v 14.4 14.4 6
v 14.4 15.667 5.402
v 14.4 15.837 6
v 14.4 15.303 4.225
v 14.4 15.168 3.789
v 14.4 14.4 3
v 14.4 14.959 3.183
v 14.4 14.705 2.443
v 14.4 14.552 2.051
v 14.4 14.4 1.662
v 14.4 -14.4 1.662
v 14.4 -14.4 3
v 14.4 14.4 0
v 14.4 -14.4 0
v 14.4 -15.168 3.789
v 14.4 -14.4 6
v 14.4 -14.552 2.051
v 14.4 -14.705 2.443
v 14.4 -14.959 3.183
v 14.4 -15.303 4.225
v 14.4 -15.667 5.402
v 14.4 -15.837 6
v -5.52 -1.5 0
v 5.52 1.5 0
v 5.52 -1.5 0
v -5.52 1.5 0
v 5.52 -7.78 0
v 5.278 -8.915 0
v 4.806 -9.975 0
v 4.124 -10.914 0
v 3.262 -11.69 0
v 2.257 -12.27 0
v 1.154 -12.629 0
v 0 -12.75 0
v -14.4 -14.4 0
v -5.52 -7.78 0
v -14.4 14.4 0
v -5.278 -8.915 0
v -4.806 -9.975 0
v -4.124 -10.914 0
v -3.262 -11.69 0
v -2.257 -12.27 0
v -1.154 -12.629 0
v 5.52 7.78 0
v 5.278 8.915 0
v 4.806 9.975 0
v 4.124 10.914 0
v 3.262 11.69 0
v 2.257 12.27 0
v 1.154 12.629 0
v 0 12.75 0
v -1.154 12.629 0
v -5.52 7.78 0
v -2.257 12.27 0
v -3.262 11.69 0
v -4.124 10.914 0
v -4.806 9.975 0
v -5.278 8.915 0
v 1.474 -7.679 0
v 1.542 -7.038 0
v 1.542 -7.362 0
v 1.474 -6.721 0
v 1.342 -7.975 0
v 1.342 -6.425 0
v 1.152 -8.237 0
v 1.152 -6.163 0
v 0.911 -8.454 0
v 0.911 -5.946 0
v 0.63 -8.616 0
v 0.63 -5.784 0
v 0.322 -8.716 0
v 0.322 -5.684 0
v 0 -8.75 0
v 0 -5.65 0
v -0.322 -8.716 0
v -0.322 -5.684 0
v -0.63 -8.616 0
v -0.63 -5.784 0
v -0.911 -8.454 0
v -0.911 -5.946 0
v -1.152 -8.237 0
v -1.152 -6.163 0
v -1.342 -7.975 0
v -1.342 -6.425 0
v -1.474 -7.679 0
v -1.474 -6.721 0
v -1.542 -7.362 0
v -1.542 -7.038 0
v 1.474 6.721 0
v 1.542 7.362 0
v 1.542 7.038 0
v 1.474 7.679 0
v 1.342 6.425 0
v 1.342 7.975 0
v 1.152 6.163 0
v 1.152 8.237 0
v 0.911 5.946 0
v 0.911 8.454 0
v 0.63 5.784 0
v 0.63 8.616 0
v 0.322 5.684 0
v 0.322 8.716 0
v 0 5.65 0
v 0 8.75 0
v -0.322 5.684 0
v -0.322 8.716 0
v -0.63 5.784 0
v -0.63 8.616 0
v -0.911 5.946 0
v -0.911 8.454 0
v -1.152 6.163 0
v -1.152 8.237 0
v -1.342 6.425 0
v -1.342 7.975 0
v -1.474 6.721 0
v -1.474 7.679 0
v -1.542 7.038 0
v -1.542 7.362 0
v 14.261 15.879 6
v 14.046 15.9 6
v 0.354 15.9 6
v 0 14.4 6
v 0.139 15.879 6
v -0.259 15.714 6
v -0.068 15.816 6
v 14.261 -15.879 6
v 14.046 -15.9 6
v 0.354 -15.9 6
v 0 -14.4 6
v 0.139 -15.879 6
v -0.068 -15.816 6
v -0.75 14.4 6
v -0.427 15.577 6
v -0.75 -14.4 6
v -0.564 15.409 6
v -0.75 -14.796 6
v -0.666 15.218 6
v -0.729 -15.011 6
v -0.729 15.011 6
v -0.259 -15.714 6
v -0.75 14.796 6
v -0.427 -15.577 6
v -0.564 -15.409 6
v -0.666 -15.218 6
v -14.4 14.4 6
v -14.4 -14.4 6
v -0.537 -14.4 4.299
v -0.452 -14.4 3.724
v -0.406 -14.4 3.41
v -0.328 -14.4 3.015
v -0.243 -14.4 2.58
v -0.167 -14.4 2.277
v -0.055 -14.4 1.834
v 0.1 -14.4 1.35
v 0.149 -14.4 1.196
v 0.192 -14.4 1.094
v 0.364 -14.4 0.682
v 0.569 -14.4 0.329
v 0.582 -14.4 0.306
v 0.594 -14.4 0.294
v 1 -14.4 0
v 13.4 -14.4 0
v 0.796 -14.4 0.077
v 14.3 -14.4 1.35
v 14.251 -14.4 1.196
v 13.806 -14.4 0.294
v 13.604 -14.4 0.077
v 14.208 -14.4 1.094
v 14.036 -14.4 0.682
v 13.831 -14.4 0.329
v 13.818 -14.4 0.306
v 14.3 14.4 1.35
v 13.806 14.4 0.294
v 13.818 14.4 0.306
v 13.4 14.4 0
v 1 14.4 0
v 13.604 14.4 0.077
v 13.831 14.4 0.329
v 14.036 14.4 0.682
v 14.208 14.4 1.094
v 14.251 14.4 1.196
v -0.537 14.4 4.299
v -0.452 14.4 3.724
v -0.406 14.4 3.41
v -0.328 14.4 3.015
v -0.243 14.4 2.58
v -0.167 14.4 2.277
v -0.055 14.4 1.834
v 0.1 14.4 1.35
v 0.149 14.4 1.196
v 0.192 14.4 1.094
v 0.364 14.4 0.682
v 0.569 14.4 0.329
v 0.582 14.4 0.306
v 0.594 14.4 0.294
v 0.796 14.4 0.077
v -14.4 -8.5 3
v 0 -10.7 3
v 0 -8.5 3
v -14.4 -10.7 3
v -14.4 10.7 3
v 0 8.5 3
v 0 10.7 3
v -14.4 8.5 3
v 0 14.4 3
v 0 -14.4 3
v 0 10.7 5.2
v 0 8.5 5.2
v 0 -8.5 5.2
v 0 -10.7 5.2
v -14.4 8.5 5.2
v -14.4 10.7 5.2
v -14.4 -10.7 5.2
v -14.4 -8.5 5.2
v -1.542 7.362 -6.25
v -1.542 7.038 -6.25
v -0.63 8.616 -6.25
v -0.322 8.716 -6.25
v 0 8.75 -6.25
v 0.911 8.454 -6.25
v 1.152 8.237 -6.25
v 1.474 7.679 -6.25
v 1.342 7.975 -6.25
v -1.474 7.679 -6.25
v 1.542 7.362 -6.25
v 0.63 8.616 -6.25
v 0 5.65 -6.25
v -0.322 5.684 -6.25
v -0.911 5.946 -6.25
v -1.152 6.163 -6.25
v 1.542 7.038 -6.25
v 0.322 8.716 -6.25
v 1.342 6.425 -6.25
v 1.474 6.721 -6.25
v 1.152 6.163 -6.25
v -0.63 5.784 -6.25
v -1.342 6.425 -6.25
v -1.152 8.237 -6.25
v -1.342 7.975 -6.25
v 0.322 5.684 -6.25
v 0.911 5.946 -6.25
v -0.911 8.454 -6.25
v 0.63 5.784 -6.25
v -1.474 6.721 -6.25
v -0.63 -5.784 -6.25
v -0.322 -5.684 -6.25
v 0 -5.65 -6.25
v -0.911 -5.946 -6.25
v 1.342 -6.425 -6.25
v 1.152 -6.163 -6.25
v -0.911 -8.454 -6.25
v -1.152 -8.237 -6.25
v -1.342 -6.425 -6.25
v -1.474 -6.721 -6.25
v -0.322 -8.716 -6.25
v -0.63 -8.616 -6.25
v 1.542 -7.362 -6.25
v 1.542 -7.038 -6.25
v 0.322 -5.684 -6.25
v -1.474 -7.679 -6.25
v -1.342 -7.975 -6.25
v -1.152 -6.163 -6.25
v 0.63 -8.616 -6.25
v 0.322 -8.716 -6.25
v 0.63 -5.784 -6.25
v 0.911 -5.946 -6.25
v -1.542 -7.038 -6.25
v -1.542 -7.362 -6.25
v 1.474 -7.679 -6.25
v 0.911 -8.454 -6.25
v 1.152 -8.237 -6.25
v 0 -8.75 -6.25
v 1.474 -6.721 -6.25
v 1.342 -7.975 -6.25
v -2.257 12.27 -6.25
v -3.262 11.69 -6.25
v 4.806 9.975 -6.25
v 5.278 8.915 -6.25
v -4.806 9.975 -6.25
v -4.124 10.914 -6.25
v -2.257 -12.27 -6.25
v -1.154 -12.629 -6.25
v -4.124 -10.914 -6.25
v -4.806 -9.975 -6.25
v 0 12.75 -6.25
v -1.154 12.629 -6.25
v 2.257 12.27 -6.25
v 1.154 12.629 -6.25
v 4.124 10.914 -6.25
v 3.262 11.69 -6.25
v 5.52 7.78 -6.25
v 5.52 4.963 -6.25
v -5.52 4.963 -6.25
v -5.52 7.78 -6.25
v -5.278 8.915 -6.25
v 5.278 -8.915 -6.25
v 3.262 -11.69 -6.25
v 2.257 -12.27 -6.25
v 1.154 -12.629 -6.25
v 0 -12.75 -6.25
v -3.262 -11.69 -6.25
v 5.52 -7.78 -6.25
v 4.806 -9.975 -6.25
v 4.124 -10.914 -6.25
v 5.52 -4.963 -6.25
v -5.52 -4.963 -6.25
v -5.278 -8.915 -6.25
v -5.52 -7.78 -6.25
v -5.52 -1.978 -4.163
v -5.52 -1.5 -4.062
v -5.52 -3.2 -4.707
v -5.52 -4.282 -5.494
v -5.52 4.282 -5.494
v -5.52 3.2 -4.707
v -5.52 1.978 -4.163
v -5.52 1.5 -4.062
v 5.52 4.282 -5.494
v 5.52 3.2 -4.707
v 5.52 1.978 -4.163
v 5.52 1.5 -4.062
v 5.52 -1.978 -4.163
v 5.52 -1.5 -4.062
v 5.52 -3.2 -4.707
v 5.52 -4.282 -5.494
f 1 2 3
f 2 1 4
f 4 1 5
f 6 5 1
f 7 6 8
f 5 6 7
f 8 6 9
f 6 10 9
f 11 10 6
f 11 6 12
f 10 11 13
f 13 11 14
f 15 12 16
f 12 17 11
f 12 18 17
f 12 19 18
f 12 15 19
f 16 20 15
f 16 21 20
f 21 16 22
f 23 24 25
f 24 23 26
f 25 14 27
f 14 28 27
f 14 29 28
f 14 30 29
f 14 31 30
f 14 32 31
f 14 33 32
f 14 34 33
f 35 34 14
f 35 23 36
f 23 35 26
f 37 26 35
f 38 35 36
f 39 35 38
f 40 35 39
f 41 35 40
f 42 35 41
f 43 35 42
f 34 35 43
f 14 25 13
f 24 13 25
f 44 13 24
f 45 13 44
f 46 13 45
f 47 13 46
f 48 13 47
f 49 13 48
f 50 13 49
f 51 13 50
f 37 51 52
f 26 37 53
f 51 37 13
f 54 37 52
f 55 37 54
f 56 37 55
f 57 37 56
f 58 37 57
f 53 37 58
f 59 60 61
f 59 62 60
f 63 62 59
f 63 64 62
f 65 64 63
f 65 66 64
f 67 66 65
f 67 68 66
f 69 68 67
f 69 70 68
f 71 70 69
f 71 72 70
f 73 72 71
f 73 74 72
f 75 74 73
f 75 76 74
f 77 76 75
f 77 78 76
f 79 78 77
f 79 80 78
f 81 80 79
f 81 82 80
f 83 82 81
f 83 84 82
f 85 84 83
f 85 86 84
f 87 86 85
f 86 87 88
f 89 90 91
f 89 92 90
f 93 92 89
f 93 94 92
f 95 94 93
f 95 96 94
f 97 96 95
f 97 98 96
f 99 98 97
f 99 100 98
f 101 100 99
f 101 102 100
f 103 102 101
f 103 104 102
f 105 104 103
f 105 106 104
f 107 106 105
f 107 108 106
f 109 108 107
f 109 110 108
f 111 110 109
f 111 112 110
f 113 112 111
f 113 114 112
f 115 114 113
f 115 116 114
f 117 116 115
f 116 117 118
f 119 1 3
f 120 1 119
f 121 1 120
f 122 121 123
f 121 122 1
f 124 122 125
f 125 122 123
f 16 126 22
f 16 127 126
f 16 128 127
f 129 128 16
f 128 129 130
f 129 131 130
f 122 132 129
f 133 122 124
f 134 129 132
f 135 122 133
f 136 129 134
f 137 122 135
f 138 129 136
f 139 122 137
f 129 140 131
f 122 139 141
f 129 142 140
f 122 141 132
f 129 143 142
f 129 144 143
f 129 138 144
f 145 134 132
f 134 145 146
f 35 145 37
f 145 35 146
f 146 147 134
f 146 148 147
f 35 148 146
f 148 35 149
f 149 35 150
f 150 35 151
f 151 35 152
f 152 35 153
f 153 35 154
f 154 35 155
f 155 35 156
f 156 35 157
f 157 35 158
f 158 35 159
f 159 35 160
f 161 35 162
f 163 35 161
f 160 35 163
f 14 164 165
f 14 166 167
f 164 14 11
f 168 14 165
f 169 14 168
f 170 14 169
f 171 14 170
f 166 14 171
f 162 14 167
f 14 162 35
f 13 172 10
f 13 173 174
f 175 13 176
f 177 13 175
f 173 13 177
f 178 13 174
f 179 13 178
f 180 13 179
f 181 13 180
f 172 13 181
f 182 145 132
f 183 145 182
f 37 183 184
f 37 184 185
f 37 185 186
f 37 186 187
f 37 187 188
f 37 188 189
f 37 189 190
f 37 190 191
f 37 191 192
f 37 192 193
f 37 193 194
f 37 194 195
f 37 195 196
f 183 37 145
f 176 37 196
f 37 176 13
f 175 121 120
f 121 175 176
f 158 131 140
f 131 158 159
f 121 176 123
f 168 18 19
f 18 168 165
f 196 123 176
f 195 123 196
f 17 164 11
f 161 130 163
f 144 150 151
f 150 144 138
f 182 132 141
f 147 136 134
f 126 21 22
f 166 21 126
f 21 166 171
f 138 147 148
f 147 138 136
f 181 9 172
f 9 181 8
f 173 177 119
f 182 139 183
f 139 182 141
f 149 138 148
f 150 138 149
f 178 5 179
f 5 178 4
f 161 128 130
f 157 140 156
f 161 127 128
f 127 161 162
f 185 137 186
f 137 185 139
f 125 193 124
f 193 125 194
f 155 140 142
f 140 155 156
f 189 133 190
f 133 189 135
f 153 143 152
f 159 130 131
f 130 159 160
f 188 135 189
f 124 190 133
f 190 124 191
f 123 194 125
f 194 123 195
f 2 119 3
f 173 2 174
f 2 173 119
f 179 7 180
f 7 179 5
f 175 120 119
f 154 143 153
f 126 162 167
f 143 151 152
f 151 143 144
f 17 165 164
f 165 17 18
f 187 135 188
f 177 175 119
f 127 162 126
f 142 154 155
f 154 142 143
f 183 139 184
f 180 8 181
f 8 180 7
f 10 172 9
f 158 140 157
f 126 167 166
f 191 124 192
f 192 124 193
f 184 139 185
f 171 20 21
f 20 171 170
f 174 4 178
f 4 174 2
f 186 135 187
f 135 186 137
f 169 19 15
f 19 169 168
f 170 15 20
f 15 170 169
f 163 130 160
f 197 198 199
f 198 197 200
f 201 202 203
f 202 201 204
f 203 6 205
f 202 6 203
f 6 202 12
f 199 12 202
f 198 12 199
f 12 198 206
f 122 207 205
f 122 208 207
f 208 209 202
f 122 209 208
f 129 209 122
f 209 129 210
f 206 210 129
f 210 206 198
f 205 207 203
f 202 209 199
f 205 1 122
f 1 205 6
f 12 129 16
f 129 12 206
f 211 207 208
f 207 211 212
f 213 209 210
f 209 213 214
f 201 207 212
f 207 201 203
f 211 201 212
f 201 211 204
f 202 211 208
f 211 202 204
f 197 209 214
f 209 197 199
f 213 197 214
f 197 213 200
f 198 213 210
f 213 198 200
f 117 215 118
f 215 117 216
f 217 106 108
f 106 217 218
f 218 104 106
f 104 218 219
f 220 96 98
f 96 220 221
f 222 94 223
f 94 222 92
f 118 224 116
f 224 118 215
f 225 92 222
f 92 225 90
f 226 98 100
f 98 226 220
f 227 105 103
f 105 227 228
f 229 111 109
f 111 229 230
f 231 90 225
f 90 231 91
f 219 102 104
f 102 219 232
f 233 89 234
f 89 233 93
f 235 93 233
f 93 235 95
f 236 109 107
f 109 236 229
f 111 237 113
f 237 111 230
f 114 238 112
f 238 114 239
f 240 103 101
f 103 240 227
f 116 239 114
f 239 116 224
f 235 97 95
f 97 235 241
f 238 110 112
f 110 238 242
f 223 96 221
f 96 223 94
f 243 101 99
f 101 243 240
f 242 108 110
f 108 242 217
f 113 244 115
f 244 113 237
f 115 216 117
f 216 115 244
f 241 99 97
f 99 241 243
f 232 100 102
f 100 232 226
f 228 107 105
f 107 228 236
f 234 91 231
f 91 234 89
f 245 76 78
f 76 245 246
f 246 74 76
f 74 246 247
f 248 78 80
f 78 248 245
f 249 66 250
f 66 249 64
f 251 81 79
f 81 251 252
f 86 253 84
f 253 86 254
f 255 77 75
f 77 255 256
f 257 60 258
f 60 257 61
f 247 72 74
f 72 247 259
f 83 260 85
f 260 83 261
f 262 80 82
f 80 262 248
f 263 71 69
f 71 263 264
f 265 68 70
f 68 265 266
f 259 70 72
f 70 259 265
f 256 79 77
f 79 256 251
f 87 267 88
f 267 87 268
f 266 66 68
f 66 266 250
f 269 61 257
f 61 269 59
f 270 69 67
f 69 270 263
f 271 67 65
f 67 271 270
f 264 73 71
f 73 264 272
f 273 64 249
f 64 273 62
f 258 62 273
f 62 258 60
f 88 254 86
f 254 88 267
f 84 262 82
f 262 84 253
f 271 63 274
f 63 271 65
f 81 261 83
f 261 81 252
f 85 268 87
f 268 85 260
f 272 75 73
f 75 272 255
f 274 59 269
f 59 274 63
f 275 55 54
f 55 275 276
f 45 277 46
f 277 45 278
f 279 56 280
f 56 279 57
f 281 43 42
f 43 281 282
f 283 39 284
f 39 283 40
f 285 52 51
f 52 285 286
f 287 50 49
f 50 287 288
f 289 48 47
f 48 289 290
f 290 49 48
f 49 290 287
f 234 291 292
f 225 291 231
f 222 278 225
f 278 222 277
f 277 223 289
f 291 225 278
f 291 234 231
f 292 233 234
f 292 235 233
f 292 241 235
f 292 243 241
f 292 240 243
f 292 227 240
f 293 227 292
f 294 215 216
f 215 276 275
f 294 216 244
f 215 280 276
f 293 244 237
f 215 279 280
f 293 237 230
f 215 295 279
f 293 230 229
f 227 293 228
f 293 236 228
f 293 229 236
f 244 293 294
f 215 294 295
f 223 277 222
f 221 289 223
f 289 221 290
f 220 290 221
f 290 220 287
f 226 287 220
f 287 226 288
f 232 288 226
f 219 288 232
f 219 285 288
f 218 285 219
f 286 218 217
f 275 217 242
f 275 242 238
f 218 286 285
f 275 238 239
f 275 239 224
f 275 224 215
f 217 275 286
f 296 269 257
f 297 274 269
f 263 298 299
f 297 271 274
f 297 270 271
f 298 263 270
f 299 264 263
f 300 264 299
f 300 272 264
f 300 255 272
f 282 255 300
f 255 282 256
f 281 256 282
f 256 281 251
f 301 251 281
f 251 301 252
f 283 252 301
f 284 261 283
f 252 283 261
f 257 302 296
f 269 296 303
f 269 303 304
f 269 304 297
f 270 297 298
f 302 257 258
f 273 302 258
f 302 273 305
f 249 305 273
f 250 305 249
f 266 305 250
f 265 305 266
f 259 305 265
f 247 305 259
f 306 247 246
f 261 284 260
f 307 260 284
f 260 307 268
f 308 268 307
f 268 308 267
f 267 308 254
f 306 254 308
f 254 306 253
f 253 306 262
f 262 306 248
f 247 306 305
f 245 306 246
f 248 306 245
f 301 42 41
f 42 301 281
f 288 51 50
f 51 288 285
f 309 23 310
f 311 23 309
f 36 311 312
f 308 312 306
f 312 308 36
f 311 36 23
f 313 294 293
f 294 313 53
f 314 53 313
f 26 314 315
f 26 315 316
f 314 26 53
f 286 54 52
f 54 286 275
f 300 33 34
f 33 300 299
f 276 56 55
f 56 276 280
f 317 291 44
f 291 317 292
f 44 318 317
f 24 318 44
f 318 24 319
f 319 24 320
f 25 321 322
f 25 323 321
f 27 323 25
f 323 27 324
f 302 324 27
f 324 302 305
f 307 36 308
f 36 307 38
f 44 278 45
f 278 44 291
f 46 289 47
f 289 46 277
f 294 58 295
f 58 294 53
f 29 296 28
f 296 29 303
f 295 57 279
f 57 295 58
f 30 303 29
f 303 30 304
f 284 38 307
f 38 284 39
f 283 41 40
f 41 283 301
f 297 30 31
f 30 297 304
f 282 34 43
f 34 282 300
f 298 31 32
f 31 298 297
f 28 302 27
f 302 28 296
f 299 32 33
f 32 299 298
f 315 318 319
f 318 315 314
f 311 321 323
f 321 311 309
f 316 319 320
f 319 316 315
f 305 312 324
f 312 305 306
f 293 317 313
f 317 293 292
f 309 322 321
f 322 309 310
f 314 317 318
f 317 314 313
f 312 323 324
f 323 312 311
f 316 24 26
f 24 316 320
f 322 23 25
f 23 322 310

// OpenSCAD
// file: pen_mount_ender_3_pro.scad
$fn=30;

screw_hole_dist=14.4;
screw_hole_dia=3.3-0.2;
screw_hole_rad=screw_hole_dia/2;
total_body_width=12.5;
vert_offset = 4.0;

pen_rad=6;//4;
gap_size=0.4;

module screw_hole(dist, rad, height) {
    cylinder(h=height, r=rad);
}

module screw_holes(dist, rad, height) {
    translate([0,height/2,0]) 
    rotate([90,0,0]) {
        translate([dist/2,0,0])
        screw_hole(dist, rad, height);
        translate([-dist/2,0,0])
        screw_hole(dist, rad, height);
    }
}

screw_wall_thick=4;
module mount_body(body_width) {
    difference() {
    hull()
    screw_holes(screw_hole_dist, screw_hole_rad+screw_wall_thick, body_width);
    screw_holes(screw_hole_dist, screw_hole_rad, 10*body_width);
    }
}

module body_half(body_width) {
    difference() {
    mount_body(body_width);
    translate([0,vert_offset+body_width/2,-50/2])
    cylinder(h=10*pen_rad, r=pen_rad+gap_size);
    }
}

module parts_together() {
    translate([0,-(total_body_width/2/2+gap_size)])
    body_half(total_body_width/2);
    rotate([180,0,0])
    translate([0,-(total_body_width/2/2+gap_size)])
    body_half(total_body_width/2);
}

module print_parts() {
    translate([0,total_body_width,0])
    rotate([90,0,0])
    body_half(total_body_width/2);
    translate([0,total_body_width,0])
    rotate([90,0,0])
    body_half(total_body_width/2);
}

module one_half() {
    translate([0,0,total_body_width/4])
    rotate([90,0,0])
    body_half(total_body_width/2);
    //translate([0,total_body_width,0])
    //rotate([90,0,0])
    //body_half(total_body_width/2);
}

one_half();
// main file
// Spring-Retracting Multi-Utensil Holder for Ender 3 Pro Chassis
// 2025-03-06

use <pen_mount_ender_3_pro.scad>;
$fn = 32;

// Ender 3 Dimensions
ender_screw_hole_dist=14.4; // Distance between ender mount holes
ender_screw_hole_dia=3.3; // M3 Screw diameter
ender_screw_hole_rad=ender_screw_hole_dia/2;

bevel_tolerance = 0.8;
screw_bevel_dia = 5.45+bevel_tolerance;
screw_bevel_rad = screw_bevel_dia/2.0;
screw_bevel_dist = 1.9+bevel_tolerance;

rounding = 2.0;

// Utensils
pen_rad=4; // Radius of a typical pen

// Slider Dimensions
slider_panel_len = 1*ender_screw_hole_dist;
slider_panel_wid = 2*ender_screw_hole_dist;
slider_panel_h = 3.0;
sliding_bar_wid = 2.0;
sliding_bar_len = ender_screw_hole_dist;
sliding_bar_h = sliding_bar_wid;
slider_spacing = 0.2;

module screwBevel3D() {
    cylinder(d1=screw_bevel_dia, d2=ender_screw_hole_dia, h=screw_bevel_dist);
}

//screwBevel3D();

module slidingBar2D(spacing=0) {
    square([sliding_bar_len, sliding_bar_wid+spacing], center=true);
}

module slidingBars2D(spacing=0) {
    // Sliding bars
    translate([-slider_panel_len,ender_screw_hole_dist/1.5,0])
    slidingBar2D(spacing);
    translate([-slider_panel_len,-ender_screw_hole_dist/1.5,0])
    slidingBar2D(spacing);
}

module sliderPanel2D(do_holes=true) {
    // Body of slider
    difference() {
    square([slider_panel_len, slider_panel_wid], center=true);
    if (do_holes) {
        translate([0,-ender_screw_hole_dist/2,0])
        circle(r=ender_screw_hole_rad);
        translate([0,ender_screw_hole_dist/2,0])
        circle(r=ender_screw_hole_rad);
    }
    }
    
    //slidingBars2D();
}

module slidingBars3D(spacing=0) {
    linear_extrude(sliding_bar_h+spacing)
    slidingBars2D(spacing);
}

module sliderPanel3D(do_holes=true, spacing=0) {
    difference() {
    union() {
    linear_extrude(slider_panel_h)
    //offset(rounding) offset(-rounding)
    sliderPanel2D(do_holes);
    slidingBars3D(spacing);
    }
    if (do_holes) {
    translate([0,-ender_screw_hole_dist/2,0])
    screwBevel3D();
    translate([0,ender_screw_hole_dist/2,0])
    screwBevel3D();
    }
    }
}

module sliderAttach3D() {
    translate([0,0,slider_panel_h])
    rotate([180,0,0])
    difference() {
        union() {
            translate([-sliding_bar_len/2,0,slider_panel_h])
            cube([slider_panel_len+sliding_bar_len, slider_panel_wid, slider_panel_h*2], center=true);
            translate([0,0,slider_panel_h*2])
            rotate([0,180,0])
            linear_extrude(slider_panel_h*2, scale=(slider_panel_h+slider_panel_wid)/slider_panel_wid)
            offset(1) offset(-1)
            square([slider_panel_len, slider_panel_wid], center=true);
        }
        translate([50+slider_panel_len/2,0,0])
        cube([100,100,100], center=true);
        translate([0,0,slider_panel_h])
        rotate([180,0,0])
        sliderPanel3D(false, slider_spacing);
    }
}

module spacerPanel3D() {
    difference() {
    translate([-sliding_bar_len/2,0,(slider_panel_h/2)*1.5])
    cube([slider_panel_len+sliding_bar_len, slider_panel_wid, slider_panel_h*1.5], center=true);
    translate([0,-ender_screw_hole_dist/2,0])
    cylinder(r=ender_screw_hole_rad, h=slider_panel_h*1.5);
    translate([0,ender_screw_hole_dist/2,0])
    cylinder(r=ender_screw_hole_rad, h=slider_panel_h*1.5);
    }
}

translate([sliding_bar_len/2,0,slider_panel_h])
sliderAttach3D();
//sliderPanel3D();

//spacerPanel3D();

rotate([180,0,90])
difference() {
one_half();
cube([3,12,10], center=true);
}
